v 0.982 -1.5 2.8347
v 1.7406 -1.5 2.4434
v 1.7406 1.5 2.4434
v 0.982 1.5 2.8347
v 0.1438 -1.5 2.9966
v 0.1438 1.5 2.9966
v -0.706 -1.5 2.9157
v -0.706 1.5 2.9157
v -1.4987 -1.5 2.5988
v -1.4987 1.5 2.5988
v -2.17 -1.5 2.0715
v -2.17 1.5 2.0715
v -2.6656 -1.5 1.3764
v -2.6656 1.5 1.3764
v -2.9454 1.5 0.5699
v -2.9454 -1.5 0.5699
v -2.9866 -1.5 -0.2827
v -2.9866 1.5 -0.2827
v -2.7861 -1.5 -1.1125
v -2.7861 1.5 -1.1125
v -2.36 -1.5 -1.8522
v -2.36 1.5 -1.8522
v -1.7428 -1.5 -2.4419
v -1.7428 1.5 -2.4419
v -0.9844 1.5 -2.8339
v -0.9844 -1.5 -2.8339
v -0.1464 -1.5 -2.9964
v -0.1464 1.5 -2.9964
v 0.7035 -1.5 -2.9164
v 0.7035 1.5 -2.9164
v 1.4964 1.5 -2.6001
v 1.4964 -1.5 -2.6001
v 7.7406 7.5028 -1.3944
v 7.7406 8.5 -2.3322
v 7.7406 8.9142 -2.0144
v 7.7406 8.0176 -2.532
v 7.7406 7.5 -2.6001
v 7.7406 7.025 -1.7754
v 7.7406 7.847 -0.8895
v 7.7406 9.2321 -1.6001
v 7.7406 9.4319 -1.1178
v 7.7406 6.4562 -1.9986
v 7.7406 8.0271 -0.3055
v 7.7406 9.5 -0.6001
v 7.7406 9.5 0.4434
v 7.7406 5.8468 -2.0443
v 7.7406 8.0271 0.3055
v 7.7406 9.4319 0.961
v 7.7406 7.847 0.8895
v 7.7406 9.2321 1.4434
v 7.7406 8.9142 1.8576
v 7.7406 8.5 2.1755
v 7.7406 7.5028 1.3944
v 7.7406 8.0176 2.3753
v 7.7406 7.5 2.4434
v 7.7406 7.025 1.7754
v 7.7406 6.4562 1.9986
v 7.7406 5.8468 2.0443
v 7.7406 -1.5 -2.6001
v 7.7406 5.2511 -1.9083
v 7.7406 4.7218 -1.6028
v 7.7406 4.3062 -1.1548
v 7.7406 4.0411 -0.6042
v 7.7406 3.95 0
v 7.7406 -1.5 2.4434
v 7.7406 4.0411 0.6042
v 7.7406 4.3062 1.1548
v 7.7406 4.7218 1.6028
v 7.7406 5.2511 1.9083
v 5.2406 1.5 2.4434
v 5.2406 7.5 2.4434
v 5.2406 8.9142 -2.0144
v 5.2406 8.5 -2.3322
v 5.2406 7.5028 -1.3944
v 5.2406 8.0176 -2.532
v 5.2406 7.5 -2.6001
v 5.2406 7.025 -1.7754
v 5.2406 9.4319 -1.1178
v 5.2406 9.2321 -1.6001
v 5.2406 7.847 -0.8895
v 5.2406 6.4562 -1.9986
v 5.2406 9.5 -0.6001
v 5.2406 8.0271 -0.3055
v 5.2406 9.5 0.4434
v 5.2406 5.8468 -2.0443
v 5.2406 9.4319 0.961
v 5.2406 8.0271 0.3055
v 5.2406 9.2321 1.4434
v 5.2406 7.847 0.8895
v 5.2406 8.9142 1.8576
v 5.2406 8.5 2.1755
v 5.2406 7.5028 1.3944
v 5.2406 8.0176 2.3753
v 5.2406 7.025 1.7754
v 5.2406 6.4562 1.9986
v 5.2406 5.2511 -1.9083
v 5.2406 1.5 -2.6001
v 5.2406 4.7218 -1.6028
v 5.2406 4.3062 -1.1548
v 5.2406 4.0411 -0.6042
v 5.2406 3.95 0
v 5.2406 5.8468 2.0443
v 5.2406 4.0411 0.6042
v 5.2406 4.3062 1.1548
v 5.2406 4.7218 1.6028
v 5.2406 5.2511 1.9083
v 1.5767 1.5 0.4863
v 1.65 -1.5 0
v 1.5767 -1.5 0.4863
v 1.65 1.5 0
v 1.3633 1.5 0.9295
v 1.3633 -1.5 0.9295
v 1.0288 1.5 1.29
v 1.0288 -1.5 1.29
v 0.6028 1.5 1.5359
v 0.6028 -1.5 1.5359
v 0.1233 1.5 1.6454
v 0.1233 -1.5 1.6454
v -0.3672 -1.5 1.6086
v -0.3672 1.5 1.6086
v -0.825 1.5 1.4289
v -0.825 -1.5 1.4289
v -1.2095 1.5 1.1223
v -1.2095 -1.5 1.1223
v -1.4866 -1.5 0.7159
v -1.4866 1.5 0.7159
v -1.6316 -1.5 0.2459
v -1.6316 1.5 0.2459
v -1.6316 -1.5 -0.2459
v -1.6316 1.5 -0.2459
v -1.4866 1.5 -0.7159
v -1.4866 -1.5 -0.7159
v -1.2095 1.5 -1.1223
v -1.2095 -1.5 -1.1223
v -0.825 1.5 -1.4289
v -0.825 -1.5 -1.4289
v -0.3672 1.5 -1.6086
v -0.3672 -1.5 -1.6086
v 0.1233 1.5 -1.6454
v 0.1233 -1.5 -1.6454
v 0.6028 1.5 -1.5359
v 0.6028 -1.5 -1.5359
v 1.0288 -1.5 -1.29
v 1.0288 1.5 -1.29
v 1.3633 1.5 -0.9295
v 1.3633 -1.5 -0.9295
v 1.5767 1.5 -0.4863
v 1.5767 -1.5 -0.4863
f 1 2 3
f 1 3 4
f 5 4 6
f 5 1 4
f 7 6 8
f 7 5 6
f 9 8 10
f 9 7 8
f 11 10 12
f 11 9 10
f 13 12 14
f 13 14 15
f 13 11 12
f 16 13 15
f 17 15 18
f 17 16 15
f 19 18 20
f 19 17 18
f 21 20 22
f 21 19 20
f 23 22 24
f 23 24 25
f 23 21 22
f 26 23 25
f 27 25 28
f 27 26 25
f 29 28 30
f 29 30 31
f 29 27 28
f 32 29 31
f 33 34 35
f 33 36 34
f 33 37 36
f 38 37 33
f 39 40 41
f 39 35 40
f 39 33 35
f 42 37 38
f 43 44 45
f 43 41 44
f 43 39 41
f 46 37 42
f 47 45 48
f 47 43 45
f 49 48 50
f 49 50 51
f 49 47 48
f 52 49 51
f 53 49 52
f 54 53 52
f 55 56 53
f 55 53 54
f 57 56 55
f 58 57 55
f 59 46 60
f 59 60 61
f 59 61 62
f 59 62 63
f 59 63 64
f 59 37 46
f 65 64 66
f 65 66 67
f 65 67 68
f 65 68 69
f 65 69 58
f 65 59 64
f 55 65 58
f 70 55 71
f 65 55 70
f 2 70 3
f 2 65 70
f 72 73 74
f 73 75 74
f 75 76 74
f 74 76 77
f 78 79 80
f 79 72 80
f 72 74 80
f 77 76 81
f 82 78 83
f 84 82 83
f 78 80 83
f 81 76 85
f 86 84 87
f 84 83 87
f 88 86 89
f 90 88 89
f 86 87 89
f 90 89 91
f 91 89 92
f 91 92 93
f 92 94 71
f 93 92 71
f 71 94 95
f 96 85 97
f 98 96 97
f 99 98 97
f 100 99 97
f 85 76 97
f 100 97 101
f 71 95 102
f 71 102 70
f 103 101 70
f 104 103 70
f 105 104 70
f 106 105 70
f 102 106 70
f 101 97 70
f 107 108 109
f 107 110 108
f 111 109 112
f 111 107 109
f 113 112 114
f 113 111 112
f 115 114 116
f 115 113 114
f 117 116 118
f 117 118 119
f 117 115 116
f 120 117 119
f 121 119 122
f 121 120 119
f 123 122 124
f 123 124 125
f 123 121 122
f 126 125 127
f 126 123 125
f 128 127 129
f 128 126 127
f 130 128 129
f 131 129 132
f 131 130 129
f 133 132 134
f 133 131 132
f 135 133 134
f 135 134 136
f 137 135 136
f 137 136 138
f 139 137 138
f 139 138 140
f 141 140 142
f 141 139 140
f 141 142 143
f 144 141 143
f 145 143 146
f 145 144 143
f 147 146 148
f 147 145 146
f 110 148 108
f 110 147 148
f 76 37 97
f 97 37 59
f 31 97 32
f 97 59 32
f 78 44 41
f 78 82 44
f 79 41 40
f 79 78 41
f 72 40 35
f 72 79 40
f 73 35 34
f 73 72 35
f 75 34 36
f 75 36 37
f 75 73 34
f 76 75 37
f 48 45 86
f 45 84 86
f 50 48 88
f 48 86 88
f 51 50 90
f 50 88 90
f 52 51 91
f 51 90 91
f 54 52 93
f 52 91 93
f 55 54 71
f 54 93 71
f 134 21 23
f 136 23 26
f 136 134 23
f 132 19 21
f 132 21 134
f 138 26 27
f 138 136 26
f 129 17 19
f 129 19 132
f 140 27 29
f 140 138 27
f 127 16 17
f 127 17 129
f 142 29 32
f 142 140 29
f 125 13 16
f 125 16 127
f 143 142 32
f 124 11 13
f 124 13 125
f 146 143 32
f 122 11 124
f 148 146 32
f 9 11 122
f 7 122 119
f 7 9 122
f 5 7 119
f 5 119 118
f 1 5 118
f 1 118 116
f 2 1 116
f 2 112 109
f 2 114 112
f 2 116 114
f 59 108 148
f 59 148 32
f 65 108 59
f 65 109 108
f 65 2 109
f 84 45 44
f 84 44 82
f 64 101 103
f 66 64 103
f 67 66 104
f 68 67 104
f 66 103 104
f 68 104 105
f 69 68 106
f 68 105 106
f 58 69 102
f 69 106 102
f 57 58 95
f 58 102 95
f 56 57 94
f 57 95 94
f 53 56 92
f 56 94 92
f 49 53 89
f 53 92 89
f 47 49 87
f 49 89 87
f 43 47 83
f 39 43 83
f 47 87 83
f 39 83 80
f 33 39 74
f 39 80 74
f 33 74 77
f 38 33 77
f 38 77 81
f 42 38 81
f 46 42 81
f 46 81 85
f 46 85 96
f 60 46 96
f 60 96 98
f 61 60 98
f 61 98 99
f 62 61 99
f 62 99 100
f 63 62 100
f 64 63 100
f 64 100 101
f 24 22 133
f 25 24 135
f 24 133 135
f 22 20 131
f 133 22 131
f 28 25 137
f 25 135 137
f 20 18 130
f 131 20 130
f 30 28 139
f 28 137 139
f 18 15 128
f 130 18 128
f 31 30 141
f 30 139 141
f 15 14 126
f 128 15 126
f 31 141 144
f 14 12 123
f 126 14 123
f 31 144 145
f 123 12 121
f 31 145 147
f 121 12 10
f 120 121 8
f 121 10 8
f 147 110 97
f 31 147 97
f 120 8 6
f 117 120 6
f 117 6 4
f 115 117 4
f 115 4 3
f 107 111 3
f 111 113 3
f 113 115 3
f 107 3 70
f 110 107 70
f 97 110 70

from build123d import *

# Parameters (mm, degrees)
F0_R          = 3
F0_R_2        = 1.65
F1_DEPTH      = 1.5
F1_DEPTH_BACK = 1.5
F3_DEPTH      = 1.5
F3_DEPTH_BACK = 1.5
F4_W          = 2.5
F4_H          = 5.04355
F5_DEPTH      = 8
F6_R          = 2.05
F7_DEPTH      = 25
F8_R          = 2


with BuildPart() as f1:
    # F0 (on Front) → F1 (new body, two sides)
    with BuildSketch(Plane.XZ) as f1_sk:
        Circle(F0_R)
        Circle(F0_R_2, mode=Mode.SUBTRACT)
    extrude(amount=F1_DEPTH)
    extrude(f1_sk.sketch, amount=-F1_DEPTH_BACK)

    # F2 (on Front) → F3 (join, two sides)
    with BuildSketch(Plane.XZ) as f3_sk:
        with BuildLine():
            Line((7.740623, 2.443406), (1.740623, 2.443406))
            ThreePointArc((1.740623, 2.443406), (2.666633, 1.374433), (3, 0))
            ThreePointArc((3, 0), (2.59704, -1.501793), (1.496413, -2.600144))
            Line((1.496413, -2.600144), (7.740623, -2.600144))
            Line((7.740623, -2.600144), (7.740623, 2.443406))
        make_face()
    extrude(amount=F3_DEPTH)
    extrude(f3_sk.sketch, amount=-F3_DEPTH_BACK)

    # F4 (on face) → F5 (join)
    with BuildSketch(Plane(origin=(0, 1.5, 0), x_dir=(-1, 0, 0), z_dir=(0, 1, 0))):
        with Locations((-6.490623, -0.078369)):
            Rectangle(F4_W, F4_H)
    extrude(amount=F5_DEPTH)

    # F6 (on face) → F7 (cut)
    with BuildSketch(Plane(origin=(5.240623, 0, 0), x_dir=(0, -1, 0), z_dir=(-1, 0, 0))):
        with Locations((-6, 0)):
            Circle(F6_R)
    extrude(amount=-F7_DEPTH, mode=Mode.SUBTRACT)

    # F8
    f8_edges = [f1.edges().sort_by_distance(p)[0] for p in [
        (6.490623, 9.5, -2.600144),
        (6.490623, 9.5, 2.443406),
    ]]
    fillet(f8_edges, radius=F8_R)


solid = f1.part
